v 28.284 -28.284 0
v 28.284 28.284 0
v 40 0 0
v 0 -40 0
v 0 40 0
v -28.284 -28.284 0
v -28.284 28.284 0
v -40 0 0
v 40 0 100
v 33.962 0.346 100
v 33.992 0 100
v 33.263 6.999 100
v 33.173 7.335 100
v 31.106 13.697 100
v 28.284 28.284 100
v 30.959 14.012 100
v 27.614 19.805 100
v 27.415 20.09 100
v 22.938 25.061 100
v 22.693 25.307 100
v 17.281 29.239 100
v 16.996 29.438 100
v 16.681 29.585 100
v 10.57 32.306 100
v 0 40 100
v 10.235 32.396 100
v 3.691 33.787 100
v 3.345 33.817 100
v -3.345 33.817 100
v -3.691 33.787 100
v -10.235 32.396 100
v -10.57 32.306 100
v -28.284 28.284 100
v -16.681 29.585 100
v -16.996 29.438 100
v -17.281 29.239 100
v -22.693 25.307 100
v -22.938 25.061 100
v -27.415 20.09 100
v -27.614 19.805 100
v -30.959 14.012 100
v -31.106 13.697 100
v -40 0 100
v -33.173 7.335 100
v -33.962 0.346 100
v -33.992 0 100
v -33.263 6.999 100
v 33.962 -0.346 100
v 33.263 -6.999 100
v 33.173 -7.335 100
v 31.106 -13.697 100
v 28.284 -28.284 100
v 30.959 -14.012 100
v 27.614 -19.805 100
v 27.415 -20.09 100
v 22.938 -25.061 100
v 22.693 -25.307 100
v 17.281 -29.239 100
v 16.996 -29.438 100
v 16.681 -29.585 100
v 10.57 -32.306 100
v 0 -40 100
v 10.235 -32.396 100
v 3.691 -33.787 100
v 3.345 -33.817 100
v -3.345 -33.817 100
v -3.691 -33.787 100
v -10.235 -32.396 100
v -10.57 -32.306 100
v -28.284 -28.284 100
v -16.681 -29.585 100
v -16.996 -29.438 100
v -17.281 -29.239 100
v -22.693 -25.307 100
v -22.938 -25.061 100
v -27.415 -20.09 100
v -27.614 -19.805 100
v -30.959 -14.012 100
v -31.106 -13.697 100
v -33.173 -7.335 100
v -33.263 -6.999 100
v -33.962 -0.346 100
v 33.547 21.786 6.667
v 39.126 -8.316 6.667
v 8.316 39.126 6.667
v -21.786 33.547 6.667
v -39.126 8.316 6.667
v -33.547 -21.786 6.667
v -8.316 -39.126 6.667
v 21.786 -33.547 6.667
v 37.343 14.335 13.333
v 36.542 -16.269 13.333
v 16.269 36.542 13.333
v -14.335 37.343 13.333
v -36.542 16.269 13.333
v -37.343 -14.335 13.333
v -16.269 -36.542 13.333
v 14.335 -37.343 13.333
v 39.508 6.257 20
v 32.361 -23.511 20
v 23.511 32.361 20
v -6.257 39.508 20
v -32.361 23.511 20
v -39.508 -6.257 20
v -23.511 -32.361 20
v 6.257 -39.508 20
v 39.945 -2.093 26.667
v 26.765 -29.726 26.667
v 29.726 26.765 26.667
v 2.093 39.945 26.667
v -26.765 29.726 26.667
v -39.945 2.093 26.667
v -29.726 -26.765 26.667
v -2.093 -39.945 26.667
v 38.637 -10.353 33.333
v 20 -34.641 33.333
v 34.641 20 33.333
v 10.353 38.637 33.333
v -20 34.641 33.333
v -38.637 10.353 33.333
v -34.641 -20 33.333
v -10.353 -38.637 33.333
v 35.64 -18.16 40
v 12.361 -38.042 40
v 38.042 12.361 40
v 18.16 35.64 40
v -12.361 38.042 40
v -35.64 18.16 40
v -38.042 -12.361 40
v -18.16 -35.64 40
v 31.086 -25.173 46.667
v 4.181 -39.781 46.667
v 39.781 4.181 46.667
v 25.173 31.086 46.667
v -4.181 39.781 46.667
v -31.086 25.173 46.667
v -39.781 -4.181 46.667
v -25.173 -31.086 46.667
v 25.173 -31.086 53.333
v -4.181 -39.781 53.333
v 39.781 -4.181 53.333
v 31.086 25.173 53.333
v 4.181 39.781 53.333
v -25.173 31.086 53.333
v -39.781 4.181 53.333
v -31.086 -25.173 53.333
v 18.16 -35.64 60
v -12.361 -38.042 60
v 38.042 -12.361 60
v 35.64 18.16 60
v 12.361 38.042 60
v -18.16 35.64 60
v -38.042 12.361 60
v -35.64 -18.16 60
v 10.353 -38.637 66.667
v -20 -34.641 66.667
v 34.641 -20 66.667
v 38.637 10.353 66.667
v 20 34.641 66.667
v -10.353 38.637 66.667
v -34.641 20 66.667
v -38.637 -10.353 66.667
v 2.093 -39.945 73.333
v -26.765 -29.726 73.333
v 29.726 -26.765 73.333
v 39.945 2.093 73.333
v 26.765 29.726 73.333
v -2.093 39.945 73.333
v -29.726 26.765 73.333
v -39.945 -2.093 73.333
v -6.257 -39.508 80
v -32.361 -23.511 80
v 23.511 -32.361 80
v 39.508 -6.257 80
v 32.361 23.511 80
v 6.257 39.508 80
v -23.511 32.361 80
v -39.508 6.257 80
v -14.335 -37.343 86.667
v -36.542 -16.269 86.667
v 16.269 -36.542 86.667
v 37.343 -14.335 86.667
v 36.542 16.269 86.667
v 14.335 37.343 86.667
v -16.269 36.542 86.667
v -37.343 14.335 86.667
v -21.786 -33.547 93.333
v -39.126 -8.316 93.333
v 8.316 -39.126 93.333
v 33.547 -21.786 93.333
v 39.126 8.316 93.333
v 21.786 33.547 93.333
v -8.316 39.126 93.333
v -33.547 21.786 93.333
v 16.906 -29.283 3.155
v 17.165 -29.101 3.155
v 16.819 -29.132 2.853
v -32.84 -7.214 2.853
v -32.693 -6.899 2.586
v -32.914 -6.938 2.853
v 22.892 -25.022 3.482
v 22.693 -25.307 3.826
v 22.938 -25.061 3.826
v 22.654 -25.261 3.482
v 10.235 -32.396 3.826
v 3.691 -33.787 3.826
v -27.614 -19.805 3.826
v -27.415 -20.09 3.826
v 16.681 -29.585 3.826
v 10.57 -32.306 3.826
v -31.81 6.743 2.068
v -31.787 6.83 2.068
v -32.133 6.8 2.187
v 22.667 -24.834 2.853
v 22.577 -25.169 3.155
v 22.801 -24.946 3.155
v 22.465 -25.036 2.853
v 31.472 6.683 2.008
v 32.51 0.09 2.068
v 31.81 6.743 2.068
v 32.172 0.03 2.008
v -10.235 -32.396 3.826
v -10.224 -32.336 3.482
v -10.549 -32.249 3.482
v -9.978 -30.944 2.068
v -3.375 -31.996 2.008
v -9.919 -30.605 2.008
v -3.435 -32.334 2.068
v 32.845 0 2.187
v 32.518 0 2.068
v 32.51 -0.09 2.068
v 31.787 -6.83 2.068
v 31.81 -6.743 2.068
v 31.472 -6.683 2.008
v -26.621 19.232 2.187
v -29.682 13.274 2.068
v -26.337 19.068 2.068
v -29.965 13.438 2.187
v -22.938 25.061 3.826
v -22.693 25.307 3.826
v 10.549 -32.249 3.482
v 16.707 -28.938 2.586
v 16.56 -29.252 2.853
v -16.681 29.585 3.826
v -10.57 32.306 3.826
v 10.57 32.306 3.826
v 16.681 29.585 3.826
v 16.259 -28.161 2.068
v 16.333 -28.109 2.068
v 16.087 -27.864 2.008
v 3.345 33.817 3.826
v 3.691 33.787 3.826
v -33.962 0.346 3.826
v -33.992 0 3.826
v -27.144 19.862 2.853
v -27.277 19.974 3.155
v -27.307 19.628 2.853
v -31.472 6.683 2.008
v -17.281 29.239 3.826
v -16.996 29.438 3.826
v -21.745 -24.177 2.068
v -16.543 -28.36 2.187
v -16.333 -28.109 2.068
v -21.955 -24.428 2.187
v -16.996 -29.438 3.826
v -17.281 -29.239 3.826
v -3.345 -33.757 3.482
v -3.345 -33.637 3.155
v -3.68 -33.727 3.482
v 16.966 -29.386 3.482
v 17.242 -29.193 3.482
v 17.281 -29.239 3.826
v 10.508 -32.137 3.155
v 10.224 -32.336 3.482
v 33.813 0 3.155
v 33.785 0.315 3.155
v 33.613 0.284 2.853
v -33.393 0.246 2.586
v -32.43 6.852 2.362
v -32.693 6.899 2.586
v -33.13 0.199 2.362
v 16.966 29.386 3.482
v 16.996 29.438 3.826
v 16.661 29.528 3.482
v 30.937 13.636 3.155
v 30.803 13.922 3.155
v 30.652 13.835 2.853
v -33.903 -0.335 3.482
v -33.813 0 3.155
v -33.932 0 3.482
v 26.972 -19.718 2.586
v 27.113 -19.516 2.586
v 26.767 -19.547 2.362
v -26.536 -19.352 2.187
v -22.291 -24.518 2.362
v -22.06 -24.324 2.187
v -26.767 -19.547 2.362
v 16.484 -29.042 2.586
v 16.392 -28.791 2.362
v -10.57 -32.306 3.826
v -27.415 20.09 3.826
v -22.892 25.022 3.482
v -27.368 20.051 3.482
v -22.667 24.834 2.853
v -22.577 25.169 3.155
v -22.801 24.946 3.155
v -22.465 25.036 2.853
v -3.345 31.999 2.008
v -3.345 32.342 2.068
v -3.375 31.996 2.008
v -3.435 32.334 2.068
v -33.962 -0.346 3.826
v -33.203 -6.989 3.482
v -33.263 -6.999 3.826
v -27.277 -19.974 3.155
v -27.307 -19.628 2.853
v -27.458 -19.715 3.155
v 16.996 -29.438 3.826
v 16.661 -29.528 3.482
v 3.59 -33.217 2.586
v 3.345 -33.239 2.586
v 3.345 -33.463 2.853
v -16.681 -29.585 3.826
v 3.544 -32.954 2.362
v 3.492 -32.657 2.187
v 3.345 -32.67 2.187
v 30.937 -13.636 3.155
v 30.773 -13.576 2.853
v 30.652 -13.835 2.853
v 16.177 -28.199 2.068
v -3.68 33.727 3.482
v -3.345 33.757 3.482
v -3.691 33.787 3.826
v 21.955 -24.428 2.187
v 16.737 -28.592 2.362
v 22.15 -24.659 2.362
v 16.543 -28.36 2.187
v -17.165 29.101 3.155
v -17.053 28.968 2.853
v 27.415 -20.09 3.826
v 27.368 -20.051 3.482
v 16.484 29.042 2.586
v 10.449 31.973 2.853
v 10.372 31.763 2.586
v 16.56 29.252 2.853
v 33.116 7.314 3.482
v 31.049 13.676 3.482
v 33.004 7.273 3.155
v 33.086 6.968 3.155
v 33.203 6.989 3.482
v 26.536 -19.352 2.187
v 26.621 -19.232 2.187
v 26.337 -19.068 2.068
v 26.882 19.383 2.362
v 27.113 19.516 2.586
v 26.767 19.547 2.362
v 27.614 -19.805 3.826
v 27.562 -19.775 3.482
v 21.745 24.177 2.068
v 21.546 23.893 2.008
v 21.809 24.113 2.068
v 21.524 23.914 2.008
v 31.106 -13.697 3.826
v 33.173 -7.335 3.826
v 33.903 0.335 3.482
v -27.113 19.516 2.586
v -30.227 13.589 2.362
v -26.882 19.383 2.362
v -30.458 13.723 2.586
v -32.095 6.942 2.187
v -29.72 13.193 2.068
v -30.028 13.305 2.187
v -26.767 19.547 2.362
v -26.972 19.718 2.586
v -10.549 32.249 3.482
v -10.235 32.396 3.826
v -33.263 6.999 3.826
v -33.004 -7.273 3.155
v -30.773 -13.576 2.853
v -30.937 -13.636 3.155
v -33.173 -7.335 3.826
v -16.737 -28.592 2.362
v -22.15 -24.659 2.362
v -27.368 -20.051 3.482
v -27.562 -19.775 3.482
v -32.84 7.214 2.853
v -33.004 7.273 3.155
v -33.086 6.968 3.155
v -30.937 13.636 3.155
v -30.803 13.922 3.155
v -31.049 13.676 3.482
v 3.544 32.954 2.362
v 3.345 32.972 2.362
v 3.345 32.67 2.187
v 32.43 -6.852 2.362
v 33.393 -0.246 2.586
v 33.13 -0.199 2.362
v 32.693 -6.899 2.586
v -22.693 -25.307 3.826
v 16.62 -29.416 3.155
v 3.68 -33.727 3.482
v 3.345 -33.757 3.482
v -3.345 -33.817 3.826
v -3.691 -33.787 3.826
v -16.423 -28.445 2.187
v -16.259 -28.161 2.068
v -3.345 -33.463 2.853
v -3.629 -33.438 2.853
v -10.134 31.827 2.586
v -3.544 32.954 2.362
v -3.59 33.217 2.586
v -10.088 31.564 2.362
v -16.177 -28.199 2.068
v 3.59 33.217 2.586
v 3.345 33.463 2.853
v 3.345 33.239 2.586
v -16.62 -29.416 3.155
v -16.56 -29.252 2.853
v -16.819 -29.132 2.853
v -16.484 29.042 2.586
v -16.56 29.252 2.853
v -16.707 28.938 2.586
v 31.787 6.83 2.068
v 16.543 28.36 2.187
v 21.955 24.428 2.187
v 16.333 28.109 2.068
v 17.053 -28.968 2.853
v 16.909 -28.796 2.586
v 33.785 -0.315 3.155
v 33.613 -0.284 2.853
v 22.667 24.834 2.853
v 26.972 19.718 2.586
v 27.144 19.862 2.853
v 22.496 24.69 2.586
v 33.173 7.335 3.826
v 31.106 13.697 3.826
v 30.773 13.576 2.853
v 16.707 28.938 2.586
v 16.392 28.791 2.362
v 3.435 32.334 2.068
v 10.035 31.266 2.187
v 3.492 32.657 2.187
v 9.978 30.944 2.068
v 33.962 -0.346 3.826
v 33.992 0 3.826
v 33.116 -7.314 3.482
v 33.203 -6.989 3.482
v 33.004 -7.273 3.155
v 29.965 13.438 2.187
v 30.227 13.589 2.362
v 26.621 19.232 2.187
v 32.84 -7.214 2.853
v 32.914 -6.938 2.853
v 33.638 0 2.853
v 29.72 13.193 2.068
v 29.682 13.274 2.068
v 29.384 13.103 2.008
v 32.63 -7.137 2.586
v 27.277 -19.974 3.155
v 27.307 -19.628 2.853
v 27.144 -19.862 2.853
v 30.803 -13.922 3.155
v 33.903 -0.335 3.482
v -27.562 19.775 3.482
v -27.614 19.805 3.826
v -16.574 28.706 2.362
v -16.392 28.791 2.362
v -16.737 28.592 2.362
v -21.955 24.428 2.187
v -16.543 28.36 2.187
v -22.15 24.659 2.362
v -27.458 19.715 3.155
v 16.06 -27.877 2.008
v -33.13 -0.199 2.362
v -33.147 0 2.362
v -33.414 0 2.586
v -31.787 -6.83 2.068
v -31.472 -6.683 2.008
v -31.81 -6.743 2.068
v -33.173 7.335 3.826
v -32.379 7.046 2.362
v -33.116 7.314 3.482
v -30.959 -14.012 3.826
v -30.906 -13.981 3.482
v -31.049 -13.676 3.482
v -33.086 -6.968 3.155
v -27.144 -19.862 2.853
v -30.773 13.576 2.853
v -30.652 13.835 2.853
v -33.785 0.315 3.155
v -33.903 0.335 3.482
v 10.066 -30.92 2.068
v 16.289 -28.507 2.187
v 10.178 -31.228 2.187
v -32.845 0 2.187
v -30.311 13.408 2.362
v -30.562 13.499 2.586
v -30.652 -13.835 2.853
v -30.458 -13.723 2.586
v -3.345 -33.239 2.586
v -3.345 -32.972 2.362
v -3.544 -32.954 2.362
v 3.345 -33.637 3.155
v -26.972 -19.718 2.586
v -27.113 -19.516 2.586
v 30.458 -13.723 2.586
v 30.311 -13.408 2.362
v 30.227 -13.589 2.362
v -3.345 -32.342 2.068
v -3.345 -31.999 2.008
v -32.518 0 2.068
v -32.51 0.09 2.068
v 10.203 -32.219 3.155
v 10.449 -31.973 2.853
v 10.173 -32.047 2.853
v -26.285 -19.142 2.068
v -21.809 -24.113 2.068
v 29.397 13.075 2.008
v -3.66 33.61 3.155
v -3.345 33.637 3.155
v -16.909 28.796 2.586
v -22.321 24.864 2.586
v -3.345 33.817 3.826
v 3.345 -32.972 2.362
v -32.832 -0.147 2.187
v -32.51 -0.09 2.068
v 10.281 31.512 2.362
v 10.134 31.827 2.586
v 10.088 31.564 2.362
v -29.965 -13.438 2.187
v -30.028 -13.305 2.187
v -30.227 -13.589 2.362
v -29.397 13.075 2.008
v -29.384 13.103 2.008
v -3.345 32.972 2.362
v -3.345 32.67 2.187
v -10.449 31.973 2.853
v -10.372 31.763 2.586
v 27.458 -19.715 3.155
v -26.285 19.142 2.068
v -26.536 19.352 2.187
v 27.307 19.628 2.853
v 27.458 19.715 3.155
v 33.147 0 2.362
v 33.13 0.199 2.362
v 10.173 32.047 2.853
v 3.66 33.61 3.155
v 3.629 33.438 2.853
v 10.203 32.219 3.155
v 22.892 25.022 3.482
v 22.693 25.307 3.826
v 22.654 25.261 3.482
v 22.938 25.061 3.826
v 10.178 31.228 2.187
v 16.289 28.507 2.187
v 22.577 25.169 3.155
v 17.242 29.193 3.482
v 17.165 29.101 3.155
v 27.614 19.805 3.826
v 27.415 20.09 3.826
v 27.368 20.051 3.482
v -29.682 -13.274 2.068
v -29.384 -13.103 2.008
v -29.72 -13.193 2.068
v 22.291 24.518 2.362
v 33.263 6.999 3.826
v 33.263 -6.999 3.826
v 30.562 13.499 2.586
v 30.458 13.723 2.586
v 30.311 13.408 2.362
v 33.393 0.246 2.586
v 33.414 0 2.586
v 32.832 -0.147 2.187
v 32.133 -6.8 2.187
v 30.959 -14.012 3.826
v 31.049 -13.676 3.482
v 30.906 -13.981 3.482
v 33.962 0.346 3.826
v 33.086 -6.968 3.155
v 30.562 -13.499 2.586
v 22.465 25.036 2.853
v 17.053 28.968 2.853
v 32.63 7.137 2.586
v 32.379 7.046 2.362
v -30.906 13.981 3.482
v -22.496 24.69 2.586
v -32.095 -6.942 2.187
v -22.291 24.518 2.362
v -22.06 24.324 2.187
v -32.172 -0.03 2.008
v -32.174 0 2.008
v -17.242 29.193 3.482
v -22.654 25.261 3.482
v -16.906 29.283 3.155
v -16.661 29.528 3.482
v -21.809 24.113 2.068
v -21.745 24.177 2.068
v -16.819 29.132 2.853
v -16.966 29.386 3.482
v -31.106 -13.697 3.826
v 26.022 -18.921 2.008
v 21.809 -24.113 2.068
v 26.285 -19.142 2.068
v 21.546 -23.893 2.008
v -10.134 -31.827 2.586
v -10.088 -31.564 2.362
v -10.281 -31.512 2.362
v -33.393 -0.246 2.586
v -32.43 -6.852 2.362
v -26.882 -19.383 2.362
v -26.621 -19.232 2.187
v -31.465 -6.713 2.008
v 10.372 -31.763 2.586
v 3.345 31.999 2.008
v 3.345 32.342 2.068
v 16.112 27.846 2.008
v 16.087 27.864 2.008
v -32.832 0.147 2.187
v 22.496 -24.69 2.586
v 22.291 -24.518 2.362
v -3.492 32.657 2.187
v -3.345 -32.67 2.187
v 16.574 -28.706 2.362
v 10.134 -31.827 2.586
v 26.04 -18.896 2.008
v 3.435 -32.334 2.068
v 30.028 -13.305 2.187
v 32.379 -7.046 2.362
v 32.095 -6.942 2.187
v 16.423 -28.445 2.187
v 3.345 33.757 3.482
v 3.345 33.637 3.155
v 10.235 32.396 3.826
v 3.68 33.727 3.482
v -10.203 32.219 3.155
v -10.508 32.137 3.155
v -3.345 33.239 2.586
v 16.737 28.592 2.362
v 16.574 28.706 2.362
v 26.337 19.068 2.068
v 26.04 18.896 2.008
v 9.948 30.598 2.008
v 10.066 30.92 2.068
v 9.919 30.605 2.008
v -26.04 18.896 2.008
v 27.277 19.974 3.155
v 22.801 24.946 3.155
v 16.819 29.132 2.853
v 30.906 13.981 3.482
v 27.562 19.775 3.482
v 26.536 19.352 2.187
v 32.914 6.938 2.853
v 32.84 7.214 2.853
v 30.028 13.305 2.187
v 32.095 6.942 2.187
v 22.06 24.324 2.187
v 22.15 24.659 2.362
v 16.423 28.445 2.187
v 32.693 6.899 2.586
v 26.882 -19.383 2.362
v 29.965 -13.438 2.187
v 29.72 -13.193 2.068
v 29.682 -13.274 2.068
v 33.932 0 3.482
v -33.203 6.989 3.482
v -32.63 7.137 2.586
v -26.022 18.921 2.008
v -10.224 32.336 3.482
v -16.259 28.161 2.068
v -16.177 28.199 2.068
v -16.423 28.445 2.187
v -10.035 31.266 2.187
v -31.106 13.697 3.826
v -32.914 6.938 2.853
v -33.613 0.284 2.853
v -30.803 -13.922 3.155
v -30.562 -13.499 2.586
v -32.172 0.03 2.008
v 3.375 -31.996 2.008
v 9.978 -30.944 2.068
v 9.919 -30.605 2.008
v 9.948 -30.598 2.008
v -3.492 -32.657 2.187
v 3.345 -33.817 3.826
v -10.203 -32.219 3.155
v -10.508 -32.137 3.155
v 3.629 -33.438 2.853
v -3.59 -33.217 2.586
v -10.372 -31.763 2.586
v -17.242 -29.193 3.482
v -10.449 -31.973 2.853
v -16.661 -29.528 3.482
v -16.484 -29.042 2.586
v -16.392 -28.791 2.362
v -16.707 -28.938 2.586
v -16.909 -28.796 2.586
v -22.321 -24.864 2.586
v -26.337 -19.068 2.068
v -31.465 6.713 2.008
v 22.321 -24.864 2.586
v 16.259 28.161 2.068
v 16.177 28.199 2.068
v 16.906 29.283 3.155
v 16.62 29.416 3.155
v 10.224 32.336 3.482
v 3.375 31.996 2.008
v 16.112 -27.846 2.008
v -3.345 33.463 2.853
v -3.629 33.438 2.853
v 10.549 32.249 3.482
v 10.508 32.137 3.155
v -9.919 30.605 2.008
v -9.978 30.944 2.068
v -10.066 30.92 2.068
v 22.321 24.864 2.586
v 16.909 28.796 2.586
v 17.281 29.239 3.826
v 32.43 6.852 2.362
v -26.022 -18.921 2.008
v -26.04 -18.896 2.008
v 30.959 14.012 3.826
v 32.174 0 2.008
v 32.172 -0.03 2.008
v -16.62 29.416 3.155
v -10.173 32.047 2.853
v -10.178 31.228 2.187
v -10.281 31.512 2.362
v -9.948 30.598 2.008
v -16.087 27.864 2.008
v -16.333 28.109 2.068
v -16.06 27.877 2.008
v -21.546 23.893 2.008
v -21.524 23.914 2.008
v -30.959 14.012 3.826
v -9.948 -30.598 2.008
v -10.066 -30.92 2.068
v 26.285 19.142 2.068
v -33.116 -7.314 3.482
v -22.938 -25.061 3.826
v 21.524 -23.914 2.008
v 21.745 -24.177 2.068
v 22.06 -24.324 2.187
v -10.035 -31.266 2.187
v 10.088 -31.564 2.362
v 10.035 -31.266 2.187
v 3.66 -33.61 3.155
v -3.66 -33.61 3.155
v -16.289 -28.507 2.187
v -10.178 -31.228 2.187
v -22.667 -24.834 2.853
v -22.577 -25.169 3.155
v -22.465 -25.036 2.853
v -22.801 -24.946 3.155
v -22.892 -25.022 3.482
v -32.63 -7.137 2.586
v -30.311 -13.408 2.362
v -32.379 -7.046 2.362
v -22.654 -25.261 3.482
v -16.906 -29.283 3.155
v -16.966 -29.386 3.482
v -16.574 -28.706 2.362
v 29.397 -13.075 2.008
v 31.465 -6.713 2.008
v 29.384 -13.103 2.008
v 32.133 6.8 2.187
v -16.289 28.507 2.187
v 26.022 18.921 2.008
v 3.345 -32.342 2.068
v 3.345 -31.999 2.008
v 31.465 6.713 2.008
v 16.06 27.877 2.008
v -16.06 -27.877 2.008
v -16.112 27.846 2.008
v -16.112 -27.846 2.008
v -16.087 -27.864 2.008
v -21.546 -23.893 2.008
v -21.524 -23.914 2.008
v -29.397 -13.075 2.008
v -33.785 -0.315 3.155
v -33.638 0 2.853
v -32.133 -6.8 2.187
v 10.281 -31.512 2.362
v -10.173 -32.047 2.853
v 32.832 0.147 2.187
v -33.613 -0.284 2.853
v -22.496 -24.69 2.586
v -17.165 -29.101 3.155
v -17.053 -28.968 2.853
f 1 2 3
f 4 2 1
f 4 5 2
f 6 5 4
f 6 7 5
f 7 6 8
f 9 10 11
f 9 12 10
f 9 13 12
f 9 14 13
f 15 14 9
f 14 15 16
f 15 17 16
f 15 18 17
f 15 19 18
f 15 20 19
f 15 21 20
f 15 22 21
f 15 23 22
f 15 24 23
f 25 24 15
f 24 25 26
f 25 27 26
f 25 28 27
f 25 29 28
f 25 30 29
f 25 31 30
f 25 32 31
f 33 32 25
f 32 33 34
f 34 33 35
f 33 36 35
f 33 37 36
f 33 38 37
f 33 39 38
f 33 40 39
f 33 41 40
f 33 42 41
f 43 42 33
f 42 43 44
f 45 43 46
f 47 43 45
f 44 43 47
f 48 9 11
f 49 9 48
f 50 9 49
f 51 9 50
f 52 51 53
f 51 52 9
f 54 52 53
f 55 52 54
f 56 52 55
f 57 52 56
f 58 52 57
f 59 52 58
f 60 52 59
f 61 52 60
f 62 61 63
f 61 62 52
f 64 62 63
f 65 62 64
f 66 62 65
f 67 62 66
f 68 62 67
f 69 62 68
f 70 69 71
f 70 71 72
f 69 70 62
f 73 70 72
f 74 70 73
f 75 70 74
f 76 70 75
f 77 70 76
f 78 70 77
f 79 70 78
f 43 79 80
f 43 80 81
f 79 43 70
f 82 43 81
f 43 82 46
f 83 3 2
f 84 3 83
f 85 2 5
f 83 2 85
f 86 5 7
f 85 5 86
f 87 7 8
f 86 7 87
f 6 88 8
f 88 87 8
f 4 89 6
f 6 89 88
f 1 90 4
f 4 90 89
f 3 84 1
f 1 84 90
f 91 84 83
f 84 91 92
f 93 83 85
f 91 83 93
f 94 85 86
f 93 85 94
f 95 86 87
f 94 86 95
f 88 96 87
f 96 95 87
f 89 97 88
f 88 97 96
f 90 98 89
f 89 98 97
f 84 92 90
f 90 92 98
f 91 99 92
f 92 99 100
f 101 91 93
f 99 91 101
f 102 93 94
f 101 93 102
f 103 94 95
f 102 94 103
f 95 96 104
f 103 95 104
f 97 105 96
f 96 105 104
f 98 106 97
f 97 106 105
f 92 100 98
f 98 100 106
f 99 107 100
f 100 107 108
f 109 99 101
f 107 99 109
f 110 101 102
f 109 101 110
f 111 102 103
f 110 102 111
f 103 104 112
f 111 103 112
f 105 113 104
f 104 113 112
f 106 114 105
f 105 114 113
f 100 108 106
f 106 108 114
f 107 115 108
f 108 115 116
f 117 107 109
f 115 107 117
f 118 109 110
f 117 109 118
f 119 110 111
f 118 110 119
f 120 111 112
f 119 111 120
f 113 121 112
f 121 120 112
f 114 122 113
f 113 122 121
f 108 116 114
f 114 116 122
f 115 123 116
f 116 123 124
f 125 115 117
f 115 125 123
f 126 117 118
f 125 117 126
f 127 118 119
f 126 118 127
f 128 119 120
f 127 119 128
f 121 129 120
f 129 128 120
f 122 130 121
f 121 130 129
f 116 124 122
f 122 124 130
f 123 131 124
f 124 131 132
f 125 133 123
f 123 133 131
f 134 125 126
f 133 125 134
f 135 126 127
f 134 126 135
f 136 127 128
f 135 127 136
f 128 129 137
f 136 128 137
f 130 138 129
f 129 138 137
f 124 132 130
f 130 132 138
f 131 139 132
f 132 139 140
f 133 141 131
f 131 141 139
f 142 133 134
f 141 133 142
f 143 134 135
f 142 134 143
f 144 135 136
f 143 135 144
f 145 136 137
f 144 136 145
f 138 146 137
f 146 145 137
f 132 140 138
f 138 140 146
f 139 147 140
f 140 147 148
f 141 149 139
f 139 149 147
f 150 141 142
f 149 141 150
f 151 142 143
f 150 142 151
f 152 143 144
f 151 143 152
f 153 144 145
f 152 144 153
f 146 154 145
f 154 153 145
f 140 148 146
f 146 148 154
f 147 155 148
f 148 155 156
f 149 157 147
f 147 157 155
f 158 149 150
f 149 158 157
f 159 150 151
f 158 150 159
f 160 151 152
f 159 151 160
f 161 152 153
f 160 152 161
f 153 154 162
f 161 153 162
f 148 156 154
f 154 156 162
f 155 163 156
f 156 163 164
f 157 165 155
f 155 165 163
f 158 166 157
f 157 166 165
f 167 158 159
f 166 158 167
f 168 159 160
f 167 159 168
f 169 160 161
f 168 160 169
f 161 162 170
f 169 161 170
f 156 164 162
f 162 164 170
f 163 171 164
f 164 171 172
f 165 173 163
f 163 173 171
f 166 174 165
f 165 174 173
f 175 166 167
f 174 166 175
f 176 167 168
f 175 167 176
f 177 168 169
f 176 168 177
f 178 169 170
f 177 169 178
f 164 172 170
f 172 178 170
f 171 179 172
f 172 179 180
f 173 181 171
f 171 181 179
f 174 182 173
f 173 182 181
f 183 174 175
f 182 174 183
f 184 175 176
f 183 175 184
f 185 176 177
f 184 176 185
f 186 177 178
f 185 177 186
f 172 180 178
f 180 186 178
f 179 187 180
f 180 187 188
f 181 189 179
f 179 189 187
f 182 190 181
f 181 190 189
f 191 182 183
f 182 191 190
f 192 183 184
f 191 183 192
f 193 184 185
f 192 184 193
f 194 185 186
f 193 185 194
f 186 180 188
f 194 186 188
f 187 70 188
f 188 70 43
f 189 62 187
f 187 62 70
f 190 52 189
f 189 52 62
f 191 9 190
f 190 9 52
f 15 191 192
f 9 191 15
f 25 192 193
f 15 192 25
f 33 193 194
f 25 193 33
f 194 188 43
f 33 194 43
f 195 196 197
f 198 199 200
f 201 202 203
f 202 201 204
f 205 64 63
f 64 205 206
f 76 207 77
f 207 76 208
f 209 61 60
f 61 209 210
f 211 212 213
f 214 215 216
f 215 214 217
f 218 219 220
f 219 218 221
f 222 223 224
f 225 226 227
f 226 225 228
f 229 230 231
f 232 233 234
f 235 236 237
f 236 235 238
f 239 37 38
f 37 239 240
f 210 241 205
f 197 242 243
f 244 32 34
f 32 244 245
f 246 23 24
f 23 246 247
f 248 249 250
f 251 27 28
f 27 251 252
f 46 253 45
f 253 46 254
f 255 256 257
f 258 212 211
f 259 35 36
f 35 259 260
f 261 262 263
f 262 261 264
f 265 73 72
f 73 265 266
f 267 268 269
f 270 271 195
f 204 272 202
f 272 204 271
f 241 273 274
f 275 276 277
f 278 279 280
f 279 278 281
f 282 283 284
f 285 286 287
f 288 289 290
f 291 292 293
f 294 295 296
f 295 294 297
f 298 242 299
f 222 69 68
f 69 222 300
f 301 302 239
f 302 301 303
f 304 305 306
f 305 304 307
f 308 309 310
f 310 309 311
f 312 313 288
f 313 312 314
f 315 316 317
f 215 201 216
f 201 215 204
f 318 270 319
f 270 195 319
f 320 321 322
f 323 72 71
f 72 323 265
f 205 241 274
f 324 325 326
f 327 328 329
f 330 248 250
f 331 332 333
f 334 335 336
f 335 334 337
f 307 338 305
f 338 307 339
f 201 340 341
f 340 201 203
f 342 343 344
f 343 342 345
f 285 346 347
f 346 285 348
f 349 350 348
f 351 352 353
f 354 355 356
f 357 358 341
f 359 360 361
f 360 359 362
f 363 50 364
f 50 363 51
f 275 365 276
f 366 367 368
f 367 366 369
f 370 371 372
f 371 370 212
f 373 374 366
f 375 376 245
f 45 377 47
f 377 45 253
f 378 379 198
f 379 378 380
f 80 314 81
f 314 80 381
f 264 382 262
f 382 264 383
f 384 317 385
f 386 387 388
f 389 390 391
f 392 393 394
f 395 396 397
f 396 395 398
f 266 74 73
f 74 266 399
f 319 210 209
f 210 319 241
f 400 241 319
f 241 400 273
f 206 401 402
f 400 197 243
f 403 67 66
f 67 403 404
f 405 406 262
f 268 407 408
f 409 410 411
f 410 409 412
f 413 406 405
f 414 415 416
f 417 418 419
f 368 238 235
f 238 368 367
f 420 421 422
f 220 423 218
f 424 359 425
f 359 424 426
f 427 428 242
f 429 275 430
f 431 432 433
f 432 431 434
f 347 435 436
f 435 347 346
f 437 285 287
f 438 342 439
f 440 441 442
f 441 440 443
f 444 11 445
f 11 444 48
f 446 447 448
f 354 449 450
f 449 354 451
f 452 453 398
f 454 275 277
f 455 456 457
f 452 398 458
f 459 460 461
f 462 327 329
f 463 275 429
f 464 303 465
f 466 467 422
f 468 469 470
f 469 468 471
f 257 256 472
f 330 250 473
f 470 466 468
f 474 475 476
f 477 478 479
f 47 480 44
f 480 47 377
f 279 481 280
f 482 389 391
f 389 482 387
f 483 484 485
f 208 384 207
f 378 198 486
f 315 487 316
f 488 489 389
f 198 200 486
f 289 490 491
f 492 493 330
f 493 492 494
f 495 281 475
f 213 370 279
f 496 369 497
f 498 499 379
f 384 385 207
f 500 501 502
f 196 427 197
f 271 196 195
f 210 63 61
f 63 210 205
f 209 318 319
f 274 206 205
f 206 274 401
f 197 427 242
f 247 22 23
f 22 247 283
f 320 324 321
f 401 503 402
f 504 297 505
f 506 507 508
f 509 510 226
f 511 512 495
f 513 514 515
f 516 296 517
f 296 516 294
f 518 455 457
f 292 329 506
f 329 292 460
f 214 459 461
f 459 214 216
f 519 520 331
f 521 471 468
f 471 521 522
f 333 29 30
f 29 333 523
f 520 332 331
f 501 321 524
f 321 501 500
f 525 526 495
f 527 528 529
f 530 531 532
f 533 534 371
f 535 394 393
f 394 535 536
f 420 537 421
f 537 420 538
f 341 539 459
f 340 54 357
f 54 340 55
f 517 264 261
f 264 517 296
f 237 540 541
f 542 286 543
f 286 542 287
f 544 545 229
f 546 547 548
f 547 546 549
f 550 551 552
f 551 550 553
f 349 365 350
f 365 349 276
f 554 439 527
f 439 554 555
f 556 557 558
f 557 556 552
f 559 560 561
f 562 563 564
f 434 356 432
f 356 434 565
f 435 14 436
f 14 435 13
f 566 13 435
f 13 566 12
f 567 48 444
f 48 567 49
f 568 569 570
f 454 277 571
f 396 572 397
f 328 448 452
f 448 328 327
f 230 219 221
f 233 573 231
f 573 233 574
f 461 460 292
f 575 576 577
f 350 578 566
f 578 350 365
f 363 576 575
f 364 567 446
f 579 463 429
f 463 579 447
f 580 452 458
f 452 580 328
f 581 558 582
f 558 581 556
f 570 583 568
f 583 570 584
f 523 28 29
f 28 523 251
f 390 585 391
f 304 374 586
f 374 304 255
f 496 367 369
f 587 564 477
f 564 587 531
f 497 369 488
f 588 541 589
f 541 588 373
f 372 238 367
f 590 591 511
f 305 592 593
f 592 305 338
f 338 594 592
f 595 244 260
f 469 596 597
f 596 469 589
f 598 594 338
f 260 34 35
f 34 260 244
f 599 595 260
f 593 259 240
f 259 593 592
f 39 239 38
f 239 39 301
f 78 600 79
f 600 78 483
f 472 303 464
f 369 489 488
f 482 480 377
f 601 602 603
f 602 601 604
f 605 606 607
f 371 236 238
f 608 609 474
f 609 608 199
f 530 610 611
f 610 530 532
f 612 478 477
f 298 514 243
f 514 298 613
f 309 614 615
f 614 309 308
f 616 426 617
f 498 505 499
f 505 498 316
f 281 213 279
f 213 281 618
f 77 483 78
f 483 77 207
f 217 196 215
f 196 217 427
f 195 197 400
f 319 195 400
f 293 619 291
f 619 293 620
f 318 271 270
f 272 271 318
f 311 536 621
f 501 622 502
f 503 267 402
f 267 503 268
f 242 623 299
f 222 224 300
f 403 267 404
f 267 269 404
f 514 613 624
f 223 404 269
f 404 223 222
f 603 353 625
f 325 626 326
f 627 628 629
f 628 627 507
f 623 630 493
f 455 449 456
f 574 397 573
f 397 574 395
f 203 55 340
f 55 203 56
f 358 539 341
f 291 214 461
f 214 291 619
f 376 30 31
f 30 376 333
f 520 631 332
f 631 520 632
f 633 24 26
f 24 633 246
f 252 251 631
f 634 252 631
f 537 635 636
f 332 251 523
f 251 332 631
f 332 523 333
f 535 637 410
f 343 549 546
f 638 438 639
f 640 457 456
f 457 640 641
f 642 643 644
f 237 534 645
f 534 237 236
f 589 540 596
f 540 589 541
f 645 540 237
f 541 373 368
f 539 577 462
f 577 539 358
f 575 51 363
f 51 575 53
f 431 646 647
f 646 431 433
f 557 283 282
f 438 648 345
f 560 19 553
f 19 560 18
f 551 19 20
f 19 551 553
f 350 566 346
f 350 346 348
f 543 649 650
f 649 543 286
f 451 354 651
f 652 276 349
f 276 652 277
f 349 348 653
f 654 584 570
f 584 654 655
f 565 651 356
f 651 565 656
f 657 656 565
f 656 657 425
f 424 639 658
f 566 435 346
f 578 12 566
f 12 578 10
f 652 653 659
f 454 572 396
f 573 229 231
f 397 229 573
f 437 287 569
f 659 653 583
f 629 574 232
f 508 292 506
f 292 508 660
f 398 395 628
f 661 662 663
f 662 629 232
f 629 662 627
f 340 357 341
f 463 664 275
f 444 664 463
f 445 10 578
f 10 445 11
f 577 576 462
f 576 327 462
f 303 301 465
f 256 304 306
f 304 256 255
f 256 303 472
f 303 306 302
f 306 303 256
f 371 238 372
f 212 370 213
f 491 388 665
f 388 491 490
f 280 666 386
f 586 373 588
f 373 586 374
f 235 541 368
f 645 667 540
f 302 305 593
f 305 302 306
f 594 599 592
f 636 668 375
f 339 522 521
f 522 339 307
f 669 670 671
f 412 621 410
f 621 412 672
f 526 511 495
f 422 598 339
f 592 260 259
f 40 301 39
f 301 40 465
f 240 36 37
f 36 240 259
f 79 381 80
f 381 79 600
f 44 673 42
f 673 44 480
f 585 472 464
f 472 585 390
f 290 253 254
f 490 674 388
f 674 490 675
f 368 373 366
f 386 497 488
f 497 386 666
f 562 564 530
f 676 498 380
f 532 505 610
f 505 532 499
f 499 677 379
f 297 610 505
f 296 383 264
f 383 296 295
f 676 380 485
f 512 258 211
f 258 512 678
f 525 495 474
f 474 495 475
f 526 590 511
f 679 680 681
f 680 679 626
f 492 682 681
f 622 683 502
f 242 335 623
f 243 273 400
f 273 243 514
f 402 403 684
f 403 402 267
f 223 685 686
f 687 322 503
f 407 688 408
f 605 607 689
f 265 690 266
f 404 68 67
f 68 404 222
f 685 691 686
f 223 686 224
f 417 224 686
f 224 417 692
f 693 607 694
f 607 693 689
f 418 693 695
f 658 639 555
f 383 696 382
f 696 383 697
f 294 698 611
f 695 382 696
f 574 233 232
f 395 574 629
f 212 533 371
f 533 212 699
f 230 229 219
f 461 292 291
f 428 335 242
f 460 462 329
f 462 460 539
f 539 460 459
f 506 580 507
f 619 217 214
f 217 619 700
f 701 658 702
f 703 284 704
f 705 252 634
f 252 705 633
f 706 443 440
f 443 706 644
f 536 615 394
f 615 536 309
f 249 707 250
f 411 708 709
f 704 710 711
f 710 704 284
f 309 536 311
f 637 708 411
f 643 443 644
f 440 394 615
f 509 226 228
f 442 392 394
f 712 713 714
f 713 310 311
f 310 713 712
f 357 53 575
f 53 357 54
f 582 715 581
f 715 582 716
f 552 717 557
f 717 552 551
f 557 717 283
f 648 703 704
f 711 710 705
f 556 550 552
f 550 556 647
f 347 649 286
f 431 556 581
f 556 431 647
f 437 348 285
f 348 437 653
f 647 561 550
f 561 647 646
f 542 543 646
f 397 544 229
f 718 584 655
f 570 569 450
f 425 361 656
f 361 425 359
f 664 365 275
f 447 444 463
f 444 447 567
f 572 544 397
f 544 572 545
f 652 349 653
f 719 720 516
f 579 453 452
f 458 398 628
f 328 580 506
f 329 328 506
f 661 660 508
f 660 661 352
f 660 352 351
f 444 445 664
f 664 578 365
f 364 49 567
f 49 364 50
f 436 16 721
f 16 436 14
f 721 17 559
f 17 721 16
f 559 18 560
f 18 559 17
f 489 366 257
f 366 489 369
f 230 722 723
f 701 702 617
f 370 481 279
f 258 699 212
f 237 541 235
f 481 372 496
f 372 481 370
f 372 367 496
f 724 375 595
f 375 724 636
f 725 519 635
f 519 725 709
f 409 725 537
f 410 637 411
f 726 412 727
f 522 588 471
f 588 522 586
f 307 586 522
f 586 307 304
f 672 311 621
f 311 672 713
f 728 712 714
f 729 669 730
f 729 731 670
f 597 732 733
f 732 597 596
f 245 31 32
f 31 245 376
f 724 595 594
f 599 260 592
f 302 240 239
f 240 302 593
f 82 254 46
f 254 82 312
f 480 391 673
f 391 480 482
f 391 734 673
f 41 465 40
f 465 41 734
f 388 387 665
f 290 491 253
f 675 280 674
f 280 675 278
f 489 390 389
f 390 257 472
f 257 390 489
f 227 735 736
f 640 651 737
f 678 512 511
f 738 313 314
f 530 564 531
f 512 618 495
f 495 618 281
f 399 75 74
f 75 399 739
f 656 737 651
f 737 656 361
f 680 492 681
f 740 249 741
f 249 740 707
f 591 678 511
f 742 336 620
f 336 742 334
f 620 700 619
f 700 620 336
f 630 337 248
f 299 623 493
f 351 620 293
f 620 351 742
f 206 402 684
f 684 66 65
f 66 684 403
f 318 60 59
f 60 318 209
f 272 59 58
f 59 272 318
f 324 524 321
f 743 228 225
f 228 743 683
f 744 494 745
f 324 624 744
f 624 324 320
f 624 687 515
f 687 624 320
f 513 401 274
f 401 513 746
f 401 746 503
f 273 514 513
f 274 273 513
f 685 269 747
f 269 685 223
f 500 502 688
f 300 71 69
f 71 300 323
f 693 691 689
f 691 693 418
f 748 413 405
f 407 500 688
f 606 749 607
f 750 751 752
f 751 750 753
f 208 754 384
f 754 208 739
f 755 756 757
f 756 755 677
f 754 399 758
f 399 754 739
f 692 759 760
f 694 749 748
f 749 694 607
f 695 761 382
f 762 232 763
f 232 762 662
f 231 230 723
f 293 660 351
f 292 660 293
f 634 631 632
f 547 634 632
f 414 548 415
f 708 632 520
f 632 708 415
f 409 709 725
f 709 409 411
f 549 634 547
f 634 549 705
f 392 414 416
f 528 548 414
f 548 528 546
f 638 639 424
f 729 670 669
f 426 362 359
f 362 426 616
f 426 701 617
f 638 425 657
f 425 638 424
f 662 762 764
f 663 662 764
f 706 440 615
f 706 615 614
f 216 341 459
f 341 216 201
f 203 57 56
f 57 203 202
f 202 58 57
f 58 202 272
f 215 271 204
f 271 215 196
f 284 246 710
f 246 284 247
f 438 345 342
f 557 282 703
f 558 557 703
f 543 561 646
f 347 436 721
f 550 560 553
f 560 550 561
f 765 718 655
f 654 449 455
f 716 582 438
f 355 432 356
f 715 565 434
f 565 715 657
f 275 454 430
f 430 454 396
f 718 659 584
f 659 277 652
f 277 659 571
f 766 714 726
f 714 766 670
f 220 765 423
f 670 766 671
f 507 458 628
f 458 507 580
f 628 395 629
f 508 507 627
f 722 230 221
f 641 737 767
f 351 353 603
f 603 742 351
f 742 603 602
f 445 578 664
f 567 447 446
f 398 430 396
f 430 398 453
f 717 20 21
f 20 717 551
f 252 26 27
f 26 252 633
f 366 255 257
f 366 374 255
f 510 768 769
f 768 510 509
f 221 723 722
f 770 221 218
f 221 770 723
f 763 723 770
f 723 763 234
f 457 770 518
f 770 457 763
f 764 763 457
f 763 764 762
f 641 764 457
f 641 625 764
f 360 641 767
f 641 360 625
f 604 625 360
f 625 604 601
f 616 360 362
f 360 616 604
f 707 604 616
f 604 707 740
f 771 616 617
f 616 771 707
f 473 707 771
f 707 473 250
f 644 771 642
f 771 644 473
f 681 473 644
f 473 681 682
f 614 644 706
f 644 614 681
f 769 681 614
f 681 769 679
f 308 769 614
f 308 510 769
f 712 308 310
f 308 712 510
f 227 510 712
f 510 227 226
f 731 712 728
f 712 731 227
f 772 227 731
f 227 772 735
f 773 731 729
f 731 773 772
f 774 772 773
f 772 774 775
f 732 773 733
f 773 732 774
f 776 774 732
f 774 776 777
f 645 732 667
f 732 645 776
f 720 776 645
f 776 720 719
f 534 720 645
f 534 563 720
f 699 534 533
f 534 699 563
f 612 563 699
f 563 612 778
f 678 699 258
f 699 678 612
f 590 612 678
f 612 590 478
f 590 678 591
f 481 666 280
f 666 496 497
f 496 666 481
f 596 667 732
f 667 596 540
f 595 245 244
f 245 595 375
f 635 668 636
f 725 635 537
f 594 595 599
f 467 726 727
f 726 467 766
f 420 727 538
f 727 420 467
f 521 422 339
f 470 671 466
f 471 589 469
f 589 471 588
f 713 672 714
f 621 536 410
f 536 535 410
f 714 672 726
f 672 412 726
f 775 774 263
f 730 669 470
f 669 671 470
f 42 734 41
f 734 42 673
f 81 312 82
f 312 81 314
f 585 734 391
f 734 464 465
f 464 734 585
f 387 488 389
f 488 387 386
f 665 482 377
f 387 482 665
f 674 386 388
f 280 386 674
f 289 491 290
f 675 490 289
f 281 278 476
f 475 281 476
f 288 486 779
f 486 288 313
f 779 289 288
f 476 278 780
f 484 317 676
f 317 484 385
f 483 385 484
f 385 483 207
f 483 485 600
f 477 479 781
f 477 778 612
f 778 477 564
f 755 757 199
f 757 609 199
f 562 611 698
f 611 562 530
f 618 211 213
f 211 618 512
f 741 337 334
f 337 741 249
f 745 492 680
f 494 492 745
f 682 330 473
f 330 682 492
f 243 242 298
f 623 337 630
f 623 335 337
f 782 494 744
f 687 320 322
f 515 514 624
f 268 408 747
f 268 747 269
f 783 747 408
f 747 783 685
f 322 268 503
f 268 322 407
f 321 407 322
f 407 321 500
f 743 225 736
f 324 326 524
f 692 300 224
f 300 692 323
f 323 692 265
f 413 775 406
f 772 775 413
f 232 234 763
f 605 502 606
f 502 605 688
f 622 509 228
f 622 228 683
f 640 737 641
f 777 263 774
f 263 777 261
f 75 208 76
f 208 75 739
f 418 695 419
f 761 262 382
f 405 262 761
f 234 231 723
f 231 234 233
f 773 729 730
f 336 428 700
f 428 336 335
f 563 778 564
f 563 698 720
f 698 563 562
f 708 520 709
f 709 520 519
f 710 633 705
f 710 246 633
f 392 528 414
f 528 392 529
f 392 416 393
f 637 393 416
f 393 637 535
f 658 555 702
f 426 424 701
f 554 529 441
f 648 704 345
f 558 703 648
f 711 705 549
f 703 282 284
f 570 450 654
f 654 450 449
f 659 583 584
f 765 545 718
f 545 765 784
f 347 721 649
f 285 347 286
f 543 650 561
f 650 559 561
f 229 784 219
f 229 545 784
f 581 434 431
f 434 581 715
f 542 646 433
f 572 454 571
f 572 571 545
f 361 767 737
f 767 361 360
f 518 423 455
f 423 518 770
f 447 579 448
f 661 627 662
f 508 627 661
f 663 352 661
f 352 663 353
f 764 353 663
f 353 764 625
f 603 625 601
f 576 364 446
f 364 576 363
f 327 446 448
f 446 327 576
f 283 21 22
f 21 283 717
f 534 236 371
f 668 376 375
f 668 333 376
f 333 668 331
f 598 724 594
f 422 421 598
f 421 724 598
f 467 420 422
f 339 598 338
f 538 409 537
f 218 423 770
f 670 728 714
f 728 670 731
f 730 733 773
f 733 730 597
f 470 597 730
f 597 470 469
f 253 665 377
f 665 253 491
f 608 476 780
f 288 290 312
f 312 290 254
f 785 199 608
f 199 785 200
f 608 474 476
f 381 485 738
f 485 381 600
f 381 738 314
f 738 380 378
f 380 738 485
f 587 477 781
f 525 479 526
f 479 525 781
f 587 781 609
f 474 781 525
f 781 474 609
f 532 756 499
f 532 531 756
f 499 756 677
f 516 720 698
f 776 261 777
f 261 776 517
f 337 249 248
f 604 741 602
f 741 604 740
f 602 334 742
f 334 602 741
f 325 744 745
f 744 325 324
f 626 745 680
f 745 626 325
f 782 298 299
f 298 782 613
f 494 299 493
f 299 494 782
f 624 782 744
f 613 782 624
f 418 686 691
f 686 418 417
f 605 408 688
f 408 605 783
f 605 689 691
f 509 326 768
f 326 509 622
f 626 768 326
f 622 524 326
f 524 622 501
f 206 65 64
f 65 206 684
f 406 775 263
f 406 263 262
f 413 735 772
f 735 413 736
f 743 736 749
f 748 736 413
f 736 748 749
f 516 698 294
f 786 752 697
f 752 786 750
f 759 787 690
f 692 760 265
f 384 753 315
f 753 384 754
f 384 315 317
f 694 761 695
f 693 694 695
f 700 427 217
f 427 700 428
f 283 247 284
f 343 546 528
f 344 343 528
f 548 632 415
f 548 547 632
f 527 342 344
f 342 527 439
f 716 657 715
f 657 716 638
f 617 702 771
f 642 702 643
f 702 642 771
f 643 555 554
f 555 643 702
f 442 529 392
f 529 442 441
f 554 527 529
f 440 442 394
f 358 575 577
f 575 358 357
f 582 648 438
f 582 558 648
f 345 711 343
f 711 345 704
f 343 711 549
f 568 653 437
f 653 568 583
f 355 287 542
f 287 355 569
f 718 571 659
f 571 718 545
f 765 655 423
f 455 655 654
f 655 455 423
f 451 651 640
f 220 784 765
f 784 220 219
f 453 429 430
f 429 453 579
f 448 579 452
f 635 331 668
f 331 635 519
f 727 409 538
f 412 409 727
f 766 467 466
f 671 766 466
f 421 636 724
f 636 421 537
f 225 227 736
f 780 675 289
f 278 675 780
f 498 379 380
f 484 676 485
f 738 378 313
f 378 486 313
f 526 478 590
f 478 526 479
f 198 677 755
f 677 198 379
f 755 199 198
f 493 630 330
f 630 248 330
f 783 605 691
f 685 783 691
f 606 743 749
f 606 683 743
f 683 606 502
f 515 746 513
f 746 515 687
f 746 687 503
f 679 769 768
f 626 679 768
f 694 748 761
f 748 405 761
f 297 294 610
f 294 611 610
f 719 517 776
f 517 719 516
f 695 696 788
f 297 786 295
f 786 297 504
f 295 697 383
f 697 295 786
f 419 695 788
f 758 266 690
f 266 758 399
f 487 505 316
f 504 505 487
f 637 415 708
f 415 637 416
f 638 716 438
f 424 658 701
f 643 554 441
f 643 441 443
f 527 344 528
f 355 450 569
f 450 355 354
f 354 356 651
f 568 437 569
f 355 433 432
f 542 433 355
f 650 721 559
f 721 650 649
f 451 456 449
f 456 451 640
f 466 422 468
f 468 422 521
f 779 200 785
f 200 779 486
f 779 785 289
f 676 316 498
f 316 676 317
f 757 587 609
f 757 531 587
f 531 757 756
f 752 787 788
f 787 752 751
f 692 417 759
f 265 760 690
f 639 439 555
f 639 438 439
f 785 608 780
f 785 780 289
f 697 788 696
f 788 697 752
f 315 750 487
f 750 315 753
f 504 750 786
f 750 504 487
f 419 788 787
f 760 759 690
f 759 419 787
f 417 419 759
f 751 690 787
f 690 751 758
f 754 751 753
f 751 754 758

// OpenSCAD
OD = 80;
BaseFacets = 8;
CupHeight = 100;
BaseThickness = 4;

module outerShape() {
    linear_extrude(height=CupHeight, twist=180)
    circle(d=OD, $fn=BaseFacets);
}

module innerShape() {
    color("purple")
    translate([0, 0, BaseThickness])
    minkowski() {
        cylinder(d=OD*.8, h = CupHeight);
        sphere(r=2, $fn = 36);
    }
}

module cupShape() {
    difference() {
        outerShape();
        
        innerShape();
    }
}


//innerShape();
//outerShape();
cupShape();
